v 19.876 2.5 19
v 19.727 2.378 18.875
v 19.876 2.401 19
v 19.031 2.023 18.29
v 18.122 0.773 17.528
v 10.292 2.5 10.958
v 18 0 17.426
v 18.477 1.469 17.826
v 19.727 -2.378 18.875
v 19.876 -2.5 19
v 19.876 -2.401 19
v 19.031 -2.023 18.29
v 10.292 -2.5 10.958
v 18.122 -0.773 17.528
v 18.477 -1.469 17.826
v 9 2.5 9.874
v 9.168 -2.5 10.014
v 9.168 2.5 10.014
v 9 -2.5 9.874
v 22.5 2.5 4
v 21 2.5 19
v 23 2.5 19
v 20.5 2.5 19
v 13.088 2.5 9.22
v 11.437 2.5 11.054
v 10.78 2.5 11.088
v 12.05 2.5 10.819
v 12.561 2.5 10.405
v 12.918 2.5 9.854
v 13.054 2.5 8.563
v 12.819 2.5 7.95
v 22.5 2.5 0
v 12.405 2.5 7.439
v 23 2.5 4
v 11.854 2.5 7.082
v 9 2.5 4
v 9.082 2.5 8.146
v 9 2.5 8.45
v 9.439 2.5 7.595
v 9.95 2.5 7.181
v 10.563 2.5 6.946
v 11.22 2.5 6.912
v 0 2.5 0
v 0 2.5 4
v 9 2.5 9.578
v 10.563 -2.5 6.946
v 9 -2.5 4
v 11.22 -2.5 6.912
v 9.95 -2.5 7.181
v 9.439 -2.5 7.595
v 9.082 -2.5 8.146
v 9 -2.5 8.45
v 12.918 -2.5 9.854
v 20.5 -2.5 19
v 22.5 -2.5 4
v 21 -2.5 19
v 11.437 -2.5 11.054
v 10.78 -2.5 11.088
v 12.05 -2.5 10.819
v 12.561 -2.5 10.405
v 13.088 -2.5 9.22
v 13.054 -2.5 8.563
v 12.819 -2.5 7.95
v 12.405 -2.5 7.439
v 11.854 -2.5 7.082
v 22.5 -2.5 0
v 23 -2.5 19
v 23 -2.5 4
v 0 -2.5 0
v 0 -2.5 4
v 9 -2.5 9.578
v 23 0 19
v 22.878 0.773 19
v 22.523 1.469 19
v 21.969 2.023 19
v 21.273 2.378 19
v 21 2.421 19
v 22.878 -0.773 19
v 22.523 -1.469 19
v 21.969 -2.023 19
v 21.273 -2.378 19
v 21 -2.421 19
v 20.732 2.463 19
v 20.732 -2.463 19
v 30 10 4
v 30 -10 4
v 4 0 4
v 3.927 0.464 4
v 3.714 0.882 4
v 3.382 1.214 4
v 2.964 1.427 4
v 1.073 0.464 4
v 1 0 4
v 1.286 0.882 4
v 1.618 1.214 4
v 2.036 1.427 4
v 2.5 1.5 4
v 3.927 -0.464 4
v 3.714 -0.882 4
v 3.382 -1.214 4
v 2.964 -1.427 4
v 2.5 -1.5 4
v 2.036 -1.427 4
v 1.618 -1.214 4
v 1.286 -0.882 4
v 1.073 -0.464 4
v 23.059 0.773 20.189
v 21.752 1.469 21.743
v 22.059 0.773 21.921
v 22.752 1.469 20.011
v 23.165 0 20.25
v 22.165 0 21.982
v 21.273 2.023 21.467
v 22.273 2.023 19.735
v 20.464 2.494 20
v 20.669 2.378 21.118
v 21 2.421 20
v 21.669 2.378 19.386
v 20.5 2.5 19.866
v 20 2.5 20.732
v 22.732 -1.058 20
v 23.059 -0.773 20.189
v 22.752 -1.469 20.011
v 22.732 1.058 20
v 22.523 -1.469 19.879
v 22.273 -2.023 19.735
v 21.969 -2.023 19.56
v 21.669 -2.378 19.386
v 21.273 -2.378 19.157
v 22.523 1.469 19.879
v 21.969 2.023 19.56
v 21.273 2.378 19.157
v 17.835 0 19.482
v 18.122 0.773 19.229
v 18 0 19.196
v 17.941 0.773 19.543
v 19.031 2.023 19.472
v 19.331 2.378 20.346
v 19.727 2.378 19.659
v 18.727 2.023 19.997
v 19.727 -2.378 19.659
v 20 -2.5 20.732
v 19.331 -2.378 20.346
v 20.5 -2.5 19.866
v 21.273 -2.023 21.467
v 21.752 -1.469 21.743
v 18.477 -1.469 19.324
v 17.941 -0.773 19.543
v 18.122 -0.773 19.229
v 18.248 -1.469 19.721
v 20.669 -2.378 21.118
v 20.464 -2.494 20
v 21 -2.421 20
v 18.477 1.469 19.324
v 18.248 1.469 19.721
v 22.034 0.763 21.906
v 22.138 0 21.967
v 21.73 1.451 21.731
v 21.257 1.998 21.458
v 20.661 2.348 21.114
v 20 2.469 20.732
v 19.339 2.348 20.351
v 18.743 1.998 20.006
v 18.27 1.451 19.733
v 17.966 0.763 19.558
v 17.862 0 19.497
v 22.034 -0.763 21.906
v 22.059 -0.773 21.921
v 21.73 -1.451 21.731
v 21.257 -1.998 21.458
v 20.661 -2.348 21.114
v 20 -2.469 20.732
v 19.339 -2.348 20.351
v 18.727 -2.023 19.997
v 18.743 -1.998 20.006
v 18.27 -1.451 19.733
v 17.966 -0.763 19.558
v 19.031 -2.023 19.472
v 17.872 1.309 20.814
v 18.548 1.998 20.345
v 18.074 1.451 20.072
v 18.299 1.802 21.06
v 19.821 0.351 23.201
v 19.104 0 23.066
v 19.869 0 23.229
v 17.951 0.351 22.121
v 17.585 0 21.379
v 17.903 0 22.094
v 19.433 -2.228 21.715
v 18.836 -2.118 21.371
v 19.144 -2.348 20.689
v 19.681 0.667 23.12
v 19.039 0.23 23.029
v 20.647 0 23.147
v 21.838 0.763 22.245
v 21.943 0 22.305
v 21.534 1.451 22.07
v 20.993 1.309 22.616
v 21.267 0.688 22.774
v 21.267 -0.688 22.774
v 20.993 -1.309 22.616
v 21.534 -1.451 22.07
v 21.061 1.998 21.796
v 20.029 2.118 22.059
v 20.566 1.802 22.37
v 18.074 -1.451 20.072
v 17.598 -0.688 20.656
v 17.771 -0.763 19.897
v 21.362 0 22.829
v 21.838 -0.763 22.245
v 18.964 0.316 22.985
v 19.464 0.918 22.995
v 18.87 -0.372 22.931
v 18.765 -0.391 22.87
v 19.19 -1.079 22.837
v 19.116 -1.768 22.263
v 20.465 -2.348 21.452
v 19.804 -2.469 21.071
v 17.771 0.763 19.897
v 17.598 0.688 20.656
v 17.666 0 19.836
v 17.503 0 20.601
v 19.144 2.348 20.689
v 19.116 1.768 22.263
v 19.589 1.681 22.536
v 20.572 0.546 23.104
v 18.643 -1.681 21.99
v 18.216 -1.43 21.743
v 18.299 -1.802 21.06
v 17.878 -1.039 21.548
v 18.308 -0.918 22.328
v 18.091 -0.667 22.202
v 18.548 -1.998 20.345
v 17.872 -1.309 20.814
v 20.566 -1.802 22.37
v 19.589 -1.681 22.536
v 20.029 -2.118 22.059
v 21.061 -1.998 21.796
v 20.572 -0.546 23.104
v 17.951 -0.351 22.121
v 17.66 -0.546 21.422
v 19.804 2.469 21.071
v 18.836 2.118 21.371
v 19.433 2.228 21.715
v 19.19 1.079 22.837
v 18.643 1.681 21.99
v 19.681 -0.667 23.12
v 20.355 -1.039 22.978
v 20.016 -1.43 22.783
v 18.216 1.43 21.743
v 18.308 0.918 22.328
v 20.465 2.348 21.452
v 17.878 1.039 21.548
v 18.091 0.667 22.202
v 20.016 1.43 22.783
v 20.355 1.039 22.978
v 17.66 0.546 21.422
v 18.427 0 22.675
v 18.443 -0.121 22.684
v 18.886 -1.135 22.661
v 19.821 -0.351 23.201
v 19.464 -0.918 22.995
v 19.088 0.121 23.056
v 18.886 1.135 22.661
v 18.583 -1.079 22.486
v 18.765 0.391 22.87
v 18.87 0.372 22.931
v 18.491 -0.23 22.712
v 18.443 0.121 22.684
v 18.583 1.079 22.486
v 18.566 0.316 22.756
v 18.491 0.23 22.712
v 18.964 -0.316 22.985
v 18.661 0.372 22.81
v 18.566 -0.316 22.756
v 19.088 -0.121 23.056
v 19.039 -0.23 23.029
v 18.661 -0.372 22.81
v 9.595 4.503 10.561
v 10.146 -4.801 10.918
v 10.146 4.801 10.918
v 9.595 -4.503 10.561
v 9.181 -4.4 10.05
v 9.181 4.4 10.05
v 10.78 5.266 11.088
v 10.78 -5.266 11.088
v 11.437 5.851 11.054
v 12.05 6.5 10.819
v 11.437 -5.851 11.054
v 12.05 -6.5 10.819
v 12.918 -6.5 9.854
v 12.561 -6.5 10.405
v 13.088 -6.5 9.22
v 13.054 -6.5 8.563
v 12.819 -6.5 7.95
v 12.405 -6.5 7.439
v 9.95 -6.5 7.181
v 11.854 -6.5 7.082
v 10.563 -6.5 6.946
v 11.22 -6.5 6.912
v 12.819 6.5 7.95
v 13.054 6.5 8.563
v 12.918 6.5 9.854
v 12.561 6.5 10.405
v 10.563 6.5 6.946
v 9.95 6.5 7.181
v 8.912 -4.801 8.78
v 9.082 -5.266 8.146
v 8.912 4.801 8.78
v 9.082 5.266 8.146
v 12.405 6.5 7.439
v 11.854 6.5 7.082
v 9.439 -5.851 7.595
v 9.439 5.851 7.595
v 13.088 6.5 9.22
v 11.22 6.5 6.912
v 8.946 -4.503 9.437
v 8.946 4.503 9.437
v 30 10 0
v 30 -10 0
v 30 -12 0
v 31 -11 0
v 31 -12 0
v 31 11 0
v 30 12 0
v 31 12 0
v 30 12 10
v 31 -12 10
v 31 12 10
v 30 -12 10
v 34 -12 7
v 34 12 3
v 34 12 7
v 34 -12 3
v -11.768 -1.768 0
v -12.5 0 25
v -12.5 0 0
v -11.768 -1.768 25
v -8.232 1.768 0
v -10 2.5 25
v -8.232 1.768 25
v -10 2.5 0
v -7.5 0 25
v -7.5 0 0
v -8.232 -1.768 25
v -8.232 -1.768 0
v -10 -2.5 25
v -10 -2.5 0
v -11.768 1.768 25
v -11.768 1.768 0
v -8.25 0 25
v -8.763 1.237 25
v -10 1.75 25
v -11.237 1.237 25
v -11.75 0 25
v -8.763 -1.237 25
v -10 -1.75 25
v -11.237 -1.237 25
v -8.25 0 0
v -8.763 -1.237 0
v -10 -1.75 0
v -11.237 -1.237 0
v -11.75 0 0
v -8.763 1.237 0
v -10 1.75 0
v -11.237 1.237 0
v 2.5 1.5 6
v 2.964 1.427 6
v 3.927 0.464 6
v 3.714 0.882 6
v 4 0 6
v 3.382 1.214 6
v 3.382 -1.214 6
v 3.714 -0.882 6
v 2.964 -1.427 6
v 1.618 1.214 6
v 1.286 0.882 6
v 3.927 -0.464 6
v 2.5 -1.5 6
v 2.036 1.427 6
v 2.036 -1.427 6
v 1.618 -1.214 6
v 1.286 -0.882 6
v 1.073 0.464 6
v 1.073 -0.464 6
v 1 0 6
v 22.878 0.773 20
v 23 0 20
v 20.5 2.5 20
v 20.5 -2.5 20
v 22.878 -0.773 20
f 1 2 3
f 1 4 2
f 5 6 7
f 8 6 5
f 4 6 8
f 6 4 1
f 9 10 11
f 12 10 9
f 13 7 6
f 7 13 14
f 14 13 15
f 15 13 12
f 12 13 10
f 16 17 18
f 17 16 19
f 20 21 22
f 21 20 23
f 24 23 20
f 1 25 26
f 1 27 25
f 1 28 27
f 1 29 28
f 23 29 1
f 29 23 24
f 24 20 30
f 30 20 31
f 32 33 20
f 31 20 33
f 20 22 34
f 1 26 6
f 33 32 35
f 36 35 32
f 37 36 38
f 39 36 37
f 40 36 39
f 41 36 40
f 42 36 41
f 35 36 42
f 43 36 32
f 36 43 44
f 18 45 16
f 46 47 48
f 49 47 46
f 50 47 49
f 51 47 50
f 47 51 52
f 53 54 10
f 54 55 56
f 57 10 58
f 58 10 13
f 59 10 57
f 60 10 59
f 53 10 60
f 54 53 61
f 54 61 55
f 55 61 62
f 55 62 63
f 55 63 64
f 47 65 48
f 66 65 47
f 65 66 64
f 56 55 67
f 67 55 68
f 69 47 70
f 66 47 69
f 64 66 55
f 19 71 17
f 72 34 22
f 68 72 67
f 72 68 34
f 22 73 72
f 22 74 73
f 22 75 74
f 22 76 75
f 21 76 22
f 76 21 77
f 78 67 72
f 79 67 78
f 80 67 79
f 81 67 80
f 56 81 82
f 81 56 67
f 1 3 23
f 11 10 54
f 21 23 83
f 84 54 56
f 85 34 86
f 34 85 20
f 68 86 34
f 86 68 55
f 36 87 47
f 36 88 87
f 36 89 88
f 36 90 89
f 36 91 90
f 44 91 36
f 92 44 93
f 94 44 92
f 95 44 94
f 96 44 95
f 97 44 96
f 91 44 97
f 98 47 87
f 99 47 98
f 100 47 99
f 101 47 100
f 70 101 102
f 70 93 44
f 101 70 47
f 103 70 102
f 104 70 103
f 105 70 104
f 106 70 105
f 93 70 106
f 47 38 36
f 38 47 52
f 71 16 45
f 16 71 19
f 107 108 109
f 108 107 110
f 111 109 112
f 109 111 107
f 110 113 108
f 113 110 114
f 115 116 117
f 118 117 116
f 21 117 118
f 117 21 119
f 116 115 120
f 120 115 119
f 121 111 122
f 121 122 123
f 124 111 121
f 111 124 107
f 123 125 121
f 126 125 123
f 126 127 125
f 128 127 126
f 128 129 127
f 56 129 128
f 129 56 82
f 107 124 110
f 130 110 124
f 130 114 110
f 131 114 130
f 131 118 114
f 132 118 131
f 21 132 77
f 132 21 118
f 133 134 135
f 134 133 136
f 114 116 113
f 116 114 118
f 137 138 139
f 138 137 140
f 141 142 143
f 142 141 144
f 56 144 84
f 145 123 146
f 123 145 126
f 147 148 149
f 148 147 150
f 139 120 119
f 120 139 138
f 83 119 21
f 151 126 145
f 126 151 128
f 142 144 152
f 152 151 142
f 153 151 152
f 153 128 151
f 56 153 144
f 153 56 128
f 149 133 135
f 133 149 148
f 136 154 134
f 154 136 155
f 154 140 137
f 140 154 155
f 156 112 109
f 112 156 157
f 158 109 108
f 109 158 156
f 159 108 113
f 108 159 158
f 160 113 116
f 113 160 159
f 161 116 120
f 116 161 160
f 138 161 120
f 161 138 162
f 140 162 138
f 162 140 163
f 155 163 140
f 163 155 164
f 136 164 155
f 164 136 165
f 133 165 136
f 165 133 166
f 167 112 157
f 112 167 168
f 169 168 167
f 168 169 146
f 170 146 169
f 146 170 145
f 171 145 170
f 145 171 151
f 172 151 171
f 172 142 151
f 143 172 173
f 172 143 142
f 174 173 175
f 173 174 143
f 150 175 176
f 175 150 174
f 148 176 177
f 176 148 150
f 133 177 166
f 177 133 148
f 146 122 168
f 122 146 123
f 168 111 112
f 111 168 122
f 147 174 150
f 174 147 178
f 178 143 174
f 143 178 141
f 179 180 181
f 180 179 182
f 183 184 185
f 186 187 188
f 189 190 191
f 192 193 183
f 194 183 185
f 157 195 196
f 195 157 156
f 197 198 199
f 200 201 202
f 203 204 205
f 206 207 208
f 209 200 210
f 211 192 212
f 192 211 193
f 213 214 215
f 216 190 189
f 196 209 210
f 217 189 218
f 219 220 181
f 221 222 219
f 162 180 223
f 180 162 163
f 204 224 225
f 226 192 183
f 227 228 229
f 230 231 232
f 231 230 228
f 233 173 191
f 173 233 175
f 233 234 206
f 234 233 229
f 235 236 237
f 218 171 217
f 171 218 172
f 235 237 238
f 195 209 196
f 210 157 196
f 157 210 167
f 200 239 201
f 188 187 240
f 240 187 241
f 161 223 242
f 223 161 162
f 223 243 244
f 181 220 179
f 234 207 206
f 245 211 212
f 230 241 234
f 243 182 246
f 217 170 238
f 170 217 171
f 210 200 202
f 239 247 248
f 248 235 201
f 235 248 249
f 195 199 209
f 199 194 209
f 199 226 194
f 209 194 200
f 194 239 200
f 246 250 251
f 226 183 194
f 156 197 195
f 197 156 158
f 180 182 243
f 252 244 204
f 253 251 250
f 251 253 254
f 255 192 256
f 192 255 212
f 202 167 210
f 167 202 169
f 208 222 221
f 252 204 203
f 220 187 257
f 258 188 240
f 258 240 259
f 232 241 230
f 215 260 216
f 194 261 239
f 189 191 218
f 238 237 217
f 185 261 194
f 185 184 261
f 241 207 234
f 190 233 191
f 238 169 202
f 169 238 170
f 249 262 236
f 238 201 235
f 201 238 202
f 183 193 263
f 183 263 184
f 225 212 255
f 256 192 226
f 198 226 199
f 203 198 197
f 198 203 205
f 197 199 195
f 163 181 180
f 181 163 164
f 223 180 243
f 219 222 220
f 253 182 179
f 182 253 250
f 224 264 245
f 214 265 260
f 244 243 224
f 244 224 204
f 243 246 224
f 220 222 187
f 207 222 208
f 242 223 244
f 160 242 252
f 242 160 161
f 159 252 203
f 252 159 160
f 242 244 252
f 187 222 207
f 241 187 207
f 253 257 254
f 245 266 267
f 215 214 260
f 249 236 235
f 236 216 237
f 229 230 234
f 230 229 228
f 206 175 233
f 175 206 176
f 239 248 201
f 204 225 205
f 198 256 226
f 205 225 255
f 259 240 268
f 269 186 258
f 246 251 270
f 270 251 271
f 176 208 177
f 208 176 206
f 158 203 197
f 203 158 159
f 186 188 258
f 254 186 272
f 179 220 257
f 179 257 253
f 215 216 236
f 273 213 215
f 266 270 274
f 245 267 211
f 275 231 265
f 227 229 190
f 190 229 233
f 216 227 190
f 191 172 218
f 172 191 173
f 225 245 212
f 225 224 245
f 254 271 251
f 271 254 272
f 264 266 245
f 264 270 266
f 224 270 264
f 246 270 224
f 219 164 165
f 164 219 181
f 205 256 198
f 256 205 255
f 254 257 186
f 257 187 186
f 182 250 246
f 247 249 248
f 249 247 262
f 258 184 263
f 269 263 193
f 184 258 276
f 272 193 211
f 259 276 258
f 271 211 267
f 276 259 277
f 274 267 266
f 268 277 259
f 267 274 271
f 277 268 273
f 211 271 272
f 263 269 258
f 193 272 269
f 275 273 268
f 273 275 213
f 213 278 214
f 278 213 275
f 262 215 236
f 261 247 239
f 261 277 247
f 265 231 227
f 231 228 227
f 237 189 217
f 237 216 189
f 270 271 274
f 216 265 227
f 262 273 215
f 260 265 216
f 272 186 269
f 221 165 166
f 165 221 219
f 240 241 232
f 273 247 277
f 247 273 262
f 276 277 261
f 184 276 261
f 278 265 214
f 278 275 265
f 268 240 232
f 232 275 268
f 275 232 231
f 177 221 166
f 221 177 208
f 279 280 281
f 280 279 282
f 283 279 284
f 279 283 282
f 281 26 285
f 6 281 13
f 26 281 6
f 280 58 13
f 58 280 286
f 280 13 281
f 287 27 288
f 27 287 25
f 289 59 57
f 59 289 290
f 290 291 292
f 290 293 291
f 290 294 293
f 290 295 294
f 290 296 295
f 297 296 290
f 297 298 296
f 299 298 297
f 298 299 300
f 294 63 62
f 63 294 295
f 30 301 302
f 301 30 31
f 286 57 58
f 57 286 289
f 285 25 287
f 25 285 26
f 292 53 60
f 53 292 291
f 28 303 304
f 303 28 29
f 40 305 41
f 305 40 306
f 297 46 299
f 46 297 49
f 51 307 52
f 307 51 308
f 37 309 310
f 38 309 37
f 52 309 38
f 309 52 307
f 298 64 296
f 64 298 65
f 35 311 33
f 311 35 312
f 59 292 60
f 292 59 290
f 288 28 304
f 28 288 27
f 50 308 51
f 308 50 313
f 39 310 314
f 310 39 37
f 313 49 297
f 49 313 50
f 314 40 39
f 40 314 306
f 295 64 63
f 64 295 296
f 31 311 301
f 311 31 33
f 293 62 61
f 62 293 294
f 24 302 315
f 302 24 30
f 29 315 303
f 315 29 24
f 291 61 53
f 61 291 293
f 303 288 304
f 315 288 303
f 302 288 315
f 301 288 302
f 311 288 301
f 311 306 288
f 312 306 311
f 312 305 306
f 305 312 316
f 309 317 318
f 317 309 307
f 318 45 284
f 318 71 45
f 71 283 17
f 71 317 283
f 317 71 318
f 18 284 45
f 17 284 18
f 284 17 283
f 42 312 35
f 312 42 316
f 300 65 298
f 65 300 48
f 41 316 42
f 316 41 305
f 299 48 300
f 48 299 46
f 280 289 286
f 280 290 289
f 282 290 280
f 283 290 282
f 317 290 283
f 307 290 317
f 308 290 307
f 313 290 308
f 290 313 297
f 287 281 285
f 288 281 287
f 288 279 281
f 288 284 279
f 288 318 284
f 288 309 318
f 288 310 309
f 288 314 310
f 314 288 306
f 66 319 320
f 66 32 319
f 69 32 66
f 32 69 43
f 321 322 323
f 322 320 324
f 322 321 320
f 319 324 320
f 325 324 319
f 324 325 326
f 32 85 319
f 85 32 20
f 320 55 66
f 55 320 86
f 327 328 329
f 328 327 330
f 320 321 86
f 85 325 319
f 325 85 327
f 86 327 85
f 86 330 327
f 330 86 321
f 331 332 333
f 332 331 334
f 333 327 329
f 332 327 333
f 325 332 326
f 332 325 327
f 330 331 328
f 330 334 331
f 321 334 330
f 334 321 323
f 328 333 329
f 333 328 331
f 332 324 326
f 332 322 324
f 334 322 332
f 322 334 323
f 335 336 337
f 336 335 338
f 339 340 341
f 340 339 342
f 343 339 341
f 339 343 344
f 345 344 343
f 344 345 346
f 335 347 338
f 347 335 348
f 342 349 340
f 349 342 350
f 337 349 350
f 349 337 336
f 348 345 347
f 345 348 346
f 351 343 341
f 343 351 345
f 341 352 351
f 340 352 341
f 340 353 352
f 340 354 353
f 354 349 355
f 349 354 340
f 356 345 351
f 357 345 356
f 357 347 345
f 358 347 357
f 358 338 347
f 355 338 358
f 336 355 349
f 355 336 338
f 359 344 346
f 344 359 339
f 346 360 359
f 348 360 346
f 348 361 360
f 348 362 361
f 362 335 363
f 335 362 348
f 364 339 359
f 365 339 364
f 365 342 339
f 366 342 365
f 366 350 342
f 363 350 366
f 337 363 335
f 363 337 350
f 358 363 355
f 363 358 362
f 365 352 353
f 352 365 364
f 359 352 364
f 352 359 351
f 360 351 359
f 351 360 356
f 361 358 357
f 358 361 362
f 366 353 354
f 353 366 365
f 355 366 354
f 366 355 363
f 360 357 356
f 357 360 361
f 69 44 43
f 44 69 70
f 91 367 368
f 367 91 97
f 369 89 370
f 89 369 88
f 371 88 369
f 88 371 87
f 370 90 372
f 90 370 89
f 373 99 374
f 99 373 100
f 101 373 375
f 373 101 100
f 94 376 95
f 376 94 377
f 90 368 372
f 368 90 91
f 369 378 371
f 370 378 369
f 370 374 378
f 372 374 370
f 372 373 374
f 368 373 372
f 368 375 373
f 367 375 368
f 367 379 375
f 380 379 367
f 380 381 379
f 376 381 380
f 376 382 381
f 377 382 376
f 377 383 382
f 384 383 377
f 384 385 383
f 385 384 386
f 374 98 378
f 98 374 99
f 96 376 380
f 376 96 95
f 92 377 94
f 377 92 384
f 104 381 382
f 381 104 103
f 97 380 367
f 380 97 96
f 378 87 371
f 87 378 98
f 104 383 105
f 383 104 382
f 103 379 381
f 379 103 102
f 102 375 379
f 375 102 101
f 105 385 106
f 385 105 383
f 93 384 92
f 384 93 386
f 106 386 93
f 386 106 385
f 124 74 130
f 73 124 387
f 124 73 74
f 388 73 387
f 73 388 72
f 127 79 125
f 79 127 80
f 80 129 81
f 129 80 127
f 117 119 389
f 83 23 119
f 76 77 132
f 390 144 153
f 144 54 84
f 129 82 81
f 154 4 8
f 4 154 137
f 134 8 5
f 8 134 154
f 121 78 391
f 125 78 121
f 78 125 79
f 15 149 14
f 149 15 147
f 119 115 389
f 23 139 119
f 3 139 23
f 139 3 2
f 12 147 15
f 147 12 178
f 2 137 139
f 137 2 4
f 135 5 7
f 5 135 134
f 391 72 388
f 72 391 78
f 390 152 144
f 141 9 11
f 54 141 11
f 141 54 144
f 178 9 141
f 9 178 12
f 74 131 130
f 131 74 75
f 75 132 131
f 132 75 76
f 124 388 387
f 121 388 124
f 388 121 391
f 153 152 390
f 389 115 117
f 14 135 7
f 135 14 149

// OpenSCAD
width=5;
translate([0,width*-.5])
  cube([30,width,4]);
translate([2.5,0]) cylinder(d=3,h=6,$fn=20);
translate([2,width*-.5,4]) intersection() {
  rotate([0,50,0]) cube([20,width,30]);
  translate([7,0]) cube([14,width,15]);
}
  translate([20.5,0,17]) cylinder(d=width,h=3,$fn=20);
translate([21,0,19]) rotate([0,-30,0]) {
  cylinder(d=width,h=2,$fn=20);
  translate([0,0,2]) sphere(d=width,$fn=20);
}
translate([11,-6.5,9]) rotate([-90,0]) rotate([0,0,210]) difference(){
  cylinder(d=4.2,h=13,$fn=20);
  translate([0,-5]) rotate([0,45,0]) cube(10);
  translate([0,-5,13]) rotate([0,45,0]) cube(10);
}
translate([20,0])
{
  intersection(){
    rotate([0,0,-45]) cube([20,20,4]);
    translate([0,-12]) cube([11,24,4]);
  }
}
translate([34,-12]) rotate([0,-90,0])
{
  difference(){
    cube([10,24,4]);
    translate([7,-0.01,0]) rotate([0,45]) cube([10,40,10]);
    translate([0,-.01,3]) rotate([0,135]) cube([10,40,10]);
  }
}
translate([-10,0])
difference(){
  cylinder(d=5,h=25,$fn=8);
  translate([0,0,-.01]) cylinder(d=3.5,h=26.02,$fn=8);
}
